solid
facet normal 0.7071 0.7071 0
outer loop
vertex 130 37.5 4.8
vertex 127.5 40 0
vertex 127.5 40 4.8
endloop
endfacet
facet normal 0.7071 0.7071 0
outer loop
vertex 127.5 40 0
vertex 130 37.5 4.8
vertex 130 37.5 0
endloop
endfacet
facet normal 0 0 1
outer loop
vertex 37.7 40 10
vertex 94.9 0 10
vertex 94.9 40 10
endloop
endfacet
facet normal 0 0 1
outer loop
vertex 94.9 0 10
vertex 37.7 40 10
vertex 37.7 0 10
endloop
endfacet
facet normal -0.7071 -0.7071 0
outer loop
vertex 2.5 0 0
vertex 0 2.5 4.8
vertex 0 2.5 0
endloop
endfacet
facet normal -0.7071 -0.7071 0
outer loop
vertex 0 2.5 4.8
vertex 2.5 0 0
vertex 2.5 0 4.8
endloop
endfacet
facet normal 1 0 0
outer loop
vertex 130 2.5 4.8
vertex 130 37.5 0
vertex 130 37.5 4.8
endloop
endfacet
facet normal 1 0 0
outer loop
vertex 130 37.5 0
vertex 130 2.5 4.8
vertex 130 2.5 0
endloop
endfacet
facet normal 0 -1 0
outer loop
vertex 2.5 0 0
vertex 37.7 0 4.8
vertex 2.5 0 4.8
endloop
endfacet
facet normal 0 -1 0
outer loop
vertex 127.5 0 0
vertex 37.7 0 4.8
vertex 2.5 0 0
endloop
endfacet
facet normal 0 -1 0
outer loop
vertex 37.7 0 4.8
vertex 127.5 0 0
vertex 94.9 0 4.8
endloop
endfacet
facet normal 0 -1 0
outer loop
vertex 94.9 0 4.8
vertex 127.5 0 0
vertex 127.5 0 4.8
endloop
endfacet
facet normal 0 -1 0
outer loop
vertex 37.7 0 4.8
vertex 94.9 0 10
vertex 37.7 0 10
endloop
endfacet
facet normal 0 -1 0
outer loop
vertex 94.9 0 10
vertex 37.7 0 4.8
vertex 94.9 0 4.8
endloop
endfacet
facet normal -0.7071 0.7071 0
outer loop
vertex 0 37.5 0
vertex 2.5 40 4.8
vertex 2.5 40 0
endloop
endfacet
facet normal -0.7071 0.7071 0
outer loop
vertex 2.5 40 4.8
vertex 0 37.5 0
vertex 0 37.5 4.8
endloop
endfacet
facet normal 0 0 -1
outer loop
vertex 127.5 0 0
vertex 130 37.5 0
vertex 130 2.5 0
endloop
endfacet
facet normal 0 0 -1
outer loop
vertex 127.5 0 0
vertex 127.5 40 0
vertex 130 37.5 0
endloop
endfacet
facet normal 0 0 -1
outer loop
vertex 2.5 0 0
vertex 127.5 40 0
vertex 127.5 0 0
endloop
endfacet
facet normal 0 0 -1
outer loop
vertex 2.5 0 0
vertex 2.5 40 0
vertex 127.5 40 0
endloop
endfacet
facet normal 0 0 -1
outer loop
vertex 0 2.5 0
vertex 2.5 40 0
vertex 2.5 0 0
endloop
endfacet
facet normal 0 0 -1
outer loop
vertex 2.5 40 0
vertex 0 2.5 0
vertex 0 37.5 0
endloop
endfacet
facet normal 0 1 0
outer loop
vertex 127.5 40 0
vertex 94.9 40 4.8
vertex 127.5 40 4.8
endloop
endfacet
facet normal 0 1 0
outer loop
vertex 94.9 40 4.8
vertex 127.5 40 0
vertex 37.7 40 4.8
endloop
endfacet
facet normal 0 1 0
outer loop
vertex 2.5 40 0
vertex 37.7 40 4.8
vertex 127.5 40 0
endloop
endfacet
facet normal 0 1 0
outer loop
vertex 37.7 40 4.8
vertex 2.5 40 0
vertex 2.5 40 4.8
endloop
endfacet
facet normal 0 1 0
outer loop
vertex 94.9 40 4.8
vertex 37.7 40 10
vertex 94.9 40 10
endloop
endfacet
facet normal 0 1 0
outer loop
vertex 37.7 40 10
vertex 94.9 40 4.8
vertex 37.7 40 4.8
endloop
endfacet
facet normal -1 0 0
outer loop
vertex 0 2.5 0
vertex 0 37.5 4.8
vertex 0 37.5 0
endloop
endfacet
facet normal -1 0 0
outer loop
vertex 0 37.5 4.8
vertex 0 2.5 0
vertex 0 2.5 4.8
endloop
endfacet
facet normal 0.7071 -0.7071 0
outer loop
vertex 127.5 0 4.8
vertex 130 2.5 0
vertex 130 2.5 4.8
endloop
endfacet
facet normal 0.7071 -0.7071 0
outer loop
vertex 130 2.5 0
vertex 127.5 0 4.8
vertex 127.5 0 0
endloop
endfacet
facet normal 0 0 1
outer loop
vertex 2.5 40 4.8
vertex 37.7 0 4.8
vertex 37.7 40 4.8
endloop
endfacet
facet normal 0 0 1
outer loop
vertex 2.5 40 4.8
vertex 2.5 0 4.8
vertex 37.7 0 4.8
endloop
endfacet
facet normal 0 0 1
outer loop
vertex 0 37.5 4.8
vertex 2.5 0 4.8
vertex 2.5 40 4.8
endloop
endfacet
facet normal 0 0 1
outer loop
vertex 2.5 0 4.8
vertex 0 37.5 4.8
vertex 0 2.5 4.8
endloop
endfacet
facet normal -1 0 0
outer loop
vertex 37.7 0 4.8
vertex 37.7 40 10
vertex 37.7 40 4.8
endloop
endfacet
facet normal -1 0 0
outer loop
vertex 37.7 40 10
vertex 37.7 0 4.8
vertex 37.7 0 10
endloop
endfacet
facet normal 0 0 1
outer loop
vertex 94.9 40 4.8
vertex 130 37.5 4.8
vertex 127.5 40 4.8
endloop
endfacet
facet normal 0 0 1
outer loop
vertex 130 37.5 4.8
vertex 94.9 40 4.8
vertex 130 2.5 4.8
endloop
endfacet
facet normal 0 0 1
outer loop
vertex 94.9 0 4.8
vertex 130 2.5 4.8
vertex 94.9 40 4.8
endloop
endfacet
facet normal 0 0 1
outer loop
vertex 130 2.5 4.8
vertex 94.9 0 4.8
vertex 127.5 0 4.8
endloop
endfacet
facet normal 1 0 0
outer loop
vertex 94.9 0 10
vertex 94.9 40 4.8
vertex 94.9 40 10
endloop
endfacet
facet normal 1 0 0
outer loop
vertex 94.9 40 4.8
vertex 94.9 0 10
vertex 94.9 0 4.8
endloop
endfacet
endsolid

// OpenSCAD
$fn = 32;

// ----------------------------------------------------------------------
// Stepped bar: centerstep, 130 x 40 x 10/4.8 mm
// ----------------------------------------------------------------------

// --- parameters (mm) ---
bar_l = 130;              // bar length, X
bar_w = 40;               // bar width, Y
plate_t = 10;             // thickness of the thick zone, Z
thin_t = 4.8;             // thickness of the thin zone
corner_c = 2.5;           // corner chamfer of the bar
step_cut = 5.2;           // material removed from the thin zone
thick_from = 37.7;        // start of the thick middle zone
thick_to = 94.9;          // end of the thick middle zone
depth_1 = 5.2;            // depth of cut 1 from the top face
depth_2 = 5.2;            // depth of cut 2 from the top face

profile = [[2.5, 0], [127.5, 0], [130, 2.5], [130, 37.5], [127.5, 40], [2.5, 40], [0, 37.5], [0, 2.5]];  // primary outline, 8 points, counter clockwise
void_1 = [[-1, -1], [37.7, -1], [37.7, 41], [-1, 41]];  // thin left end, 4 points
void_2 = [[94.9, -1], [131, -1], [131, 41], [94.9, 41]];  // thin right end, 4 points

// --- the one profile operation ---
difference() {
  linear_extrude(height = plate_t) polygon(points = profile);
  translate([0, 0, plate_t - depth_1])
    linear_extrude(height = depth_1 + 1) polygon(points = void_1);
  translate([0, 0, plate_t - depth_2])
    linear_extrude(height = depth_2 + 1) polygon(points = void_2);
}
